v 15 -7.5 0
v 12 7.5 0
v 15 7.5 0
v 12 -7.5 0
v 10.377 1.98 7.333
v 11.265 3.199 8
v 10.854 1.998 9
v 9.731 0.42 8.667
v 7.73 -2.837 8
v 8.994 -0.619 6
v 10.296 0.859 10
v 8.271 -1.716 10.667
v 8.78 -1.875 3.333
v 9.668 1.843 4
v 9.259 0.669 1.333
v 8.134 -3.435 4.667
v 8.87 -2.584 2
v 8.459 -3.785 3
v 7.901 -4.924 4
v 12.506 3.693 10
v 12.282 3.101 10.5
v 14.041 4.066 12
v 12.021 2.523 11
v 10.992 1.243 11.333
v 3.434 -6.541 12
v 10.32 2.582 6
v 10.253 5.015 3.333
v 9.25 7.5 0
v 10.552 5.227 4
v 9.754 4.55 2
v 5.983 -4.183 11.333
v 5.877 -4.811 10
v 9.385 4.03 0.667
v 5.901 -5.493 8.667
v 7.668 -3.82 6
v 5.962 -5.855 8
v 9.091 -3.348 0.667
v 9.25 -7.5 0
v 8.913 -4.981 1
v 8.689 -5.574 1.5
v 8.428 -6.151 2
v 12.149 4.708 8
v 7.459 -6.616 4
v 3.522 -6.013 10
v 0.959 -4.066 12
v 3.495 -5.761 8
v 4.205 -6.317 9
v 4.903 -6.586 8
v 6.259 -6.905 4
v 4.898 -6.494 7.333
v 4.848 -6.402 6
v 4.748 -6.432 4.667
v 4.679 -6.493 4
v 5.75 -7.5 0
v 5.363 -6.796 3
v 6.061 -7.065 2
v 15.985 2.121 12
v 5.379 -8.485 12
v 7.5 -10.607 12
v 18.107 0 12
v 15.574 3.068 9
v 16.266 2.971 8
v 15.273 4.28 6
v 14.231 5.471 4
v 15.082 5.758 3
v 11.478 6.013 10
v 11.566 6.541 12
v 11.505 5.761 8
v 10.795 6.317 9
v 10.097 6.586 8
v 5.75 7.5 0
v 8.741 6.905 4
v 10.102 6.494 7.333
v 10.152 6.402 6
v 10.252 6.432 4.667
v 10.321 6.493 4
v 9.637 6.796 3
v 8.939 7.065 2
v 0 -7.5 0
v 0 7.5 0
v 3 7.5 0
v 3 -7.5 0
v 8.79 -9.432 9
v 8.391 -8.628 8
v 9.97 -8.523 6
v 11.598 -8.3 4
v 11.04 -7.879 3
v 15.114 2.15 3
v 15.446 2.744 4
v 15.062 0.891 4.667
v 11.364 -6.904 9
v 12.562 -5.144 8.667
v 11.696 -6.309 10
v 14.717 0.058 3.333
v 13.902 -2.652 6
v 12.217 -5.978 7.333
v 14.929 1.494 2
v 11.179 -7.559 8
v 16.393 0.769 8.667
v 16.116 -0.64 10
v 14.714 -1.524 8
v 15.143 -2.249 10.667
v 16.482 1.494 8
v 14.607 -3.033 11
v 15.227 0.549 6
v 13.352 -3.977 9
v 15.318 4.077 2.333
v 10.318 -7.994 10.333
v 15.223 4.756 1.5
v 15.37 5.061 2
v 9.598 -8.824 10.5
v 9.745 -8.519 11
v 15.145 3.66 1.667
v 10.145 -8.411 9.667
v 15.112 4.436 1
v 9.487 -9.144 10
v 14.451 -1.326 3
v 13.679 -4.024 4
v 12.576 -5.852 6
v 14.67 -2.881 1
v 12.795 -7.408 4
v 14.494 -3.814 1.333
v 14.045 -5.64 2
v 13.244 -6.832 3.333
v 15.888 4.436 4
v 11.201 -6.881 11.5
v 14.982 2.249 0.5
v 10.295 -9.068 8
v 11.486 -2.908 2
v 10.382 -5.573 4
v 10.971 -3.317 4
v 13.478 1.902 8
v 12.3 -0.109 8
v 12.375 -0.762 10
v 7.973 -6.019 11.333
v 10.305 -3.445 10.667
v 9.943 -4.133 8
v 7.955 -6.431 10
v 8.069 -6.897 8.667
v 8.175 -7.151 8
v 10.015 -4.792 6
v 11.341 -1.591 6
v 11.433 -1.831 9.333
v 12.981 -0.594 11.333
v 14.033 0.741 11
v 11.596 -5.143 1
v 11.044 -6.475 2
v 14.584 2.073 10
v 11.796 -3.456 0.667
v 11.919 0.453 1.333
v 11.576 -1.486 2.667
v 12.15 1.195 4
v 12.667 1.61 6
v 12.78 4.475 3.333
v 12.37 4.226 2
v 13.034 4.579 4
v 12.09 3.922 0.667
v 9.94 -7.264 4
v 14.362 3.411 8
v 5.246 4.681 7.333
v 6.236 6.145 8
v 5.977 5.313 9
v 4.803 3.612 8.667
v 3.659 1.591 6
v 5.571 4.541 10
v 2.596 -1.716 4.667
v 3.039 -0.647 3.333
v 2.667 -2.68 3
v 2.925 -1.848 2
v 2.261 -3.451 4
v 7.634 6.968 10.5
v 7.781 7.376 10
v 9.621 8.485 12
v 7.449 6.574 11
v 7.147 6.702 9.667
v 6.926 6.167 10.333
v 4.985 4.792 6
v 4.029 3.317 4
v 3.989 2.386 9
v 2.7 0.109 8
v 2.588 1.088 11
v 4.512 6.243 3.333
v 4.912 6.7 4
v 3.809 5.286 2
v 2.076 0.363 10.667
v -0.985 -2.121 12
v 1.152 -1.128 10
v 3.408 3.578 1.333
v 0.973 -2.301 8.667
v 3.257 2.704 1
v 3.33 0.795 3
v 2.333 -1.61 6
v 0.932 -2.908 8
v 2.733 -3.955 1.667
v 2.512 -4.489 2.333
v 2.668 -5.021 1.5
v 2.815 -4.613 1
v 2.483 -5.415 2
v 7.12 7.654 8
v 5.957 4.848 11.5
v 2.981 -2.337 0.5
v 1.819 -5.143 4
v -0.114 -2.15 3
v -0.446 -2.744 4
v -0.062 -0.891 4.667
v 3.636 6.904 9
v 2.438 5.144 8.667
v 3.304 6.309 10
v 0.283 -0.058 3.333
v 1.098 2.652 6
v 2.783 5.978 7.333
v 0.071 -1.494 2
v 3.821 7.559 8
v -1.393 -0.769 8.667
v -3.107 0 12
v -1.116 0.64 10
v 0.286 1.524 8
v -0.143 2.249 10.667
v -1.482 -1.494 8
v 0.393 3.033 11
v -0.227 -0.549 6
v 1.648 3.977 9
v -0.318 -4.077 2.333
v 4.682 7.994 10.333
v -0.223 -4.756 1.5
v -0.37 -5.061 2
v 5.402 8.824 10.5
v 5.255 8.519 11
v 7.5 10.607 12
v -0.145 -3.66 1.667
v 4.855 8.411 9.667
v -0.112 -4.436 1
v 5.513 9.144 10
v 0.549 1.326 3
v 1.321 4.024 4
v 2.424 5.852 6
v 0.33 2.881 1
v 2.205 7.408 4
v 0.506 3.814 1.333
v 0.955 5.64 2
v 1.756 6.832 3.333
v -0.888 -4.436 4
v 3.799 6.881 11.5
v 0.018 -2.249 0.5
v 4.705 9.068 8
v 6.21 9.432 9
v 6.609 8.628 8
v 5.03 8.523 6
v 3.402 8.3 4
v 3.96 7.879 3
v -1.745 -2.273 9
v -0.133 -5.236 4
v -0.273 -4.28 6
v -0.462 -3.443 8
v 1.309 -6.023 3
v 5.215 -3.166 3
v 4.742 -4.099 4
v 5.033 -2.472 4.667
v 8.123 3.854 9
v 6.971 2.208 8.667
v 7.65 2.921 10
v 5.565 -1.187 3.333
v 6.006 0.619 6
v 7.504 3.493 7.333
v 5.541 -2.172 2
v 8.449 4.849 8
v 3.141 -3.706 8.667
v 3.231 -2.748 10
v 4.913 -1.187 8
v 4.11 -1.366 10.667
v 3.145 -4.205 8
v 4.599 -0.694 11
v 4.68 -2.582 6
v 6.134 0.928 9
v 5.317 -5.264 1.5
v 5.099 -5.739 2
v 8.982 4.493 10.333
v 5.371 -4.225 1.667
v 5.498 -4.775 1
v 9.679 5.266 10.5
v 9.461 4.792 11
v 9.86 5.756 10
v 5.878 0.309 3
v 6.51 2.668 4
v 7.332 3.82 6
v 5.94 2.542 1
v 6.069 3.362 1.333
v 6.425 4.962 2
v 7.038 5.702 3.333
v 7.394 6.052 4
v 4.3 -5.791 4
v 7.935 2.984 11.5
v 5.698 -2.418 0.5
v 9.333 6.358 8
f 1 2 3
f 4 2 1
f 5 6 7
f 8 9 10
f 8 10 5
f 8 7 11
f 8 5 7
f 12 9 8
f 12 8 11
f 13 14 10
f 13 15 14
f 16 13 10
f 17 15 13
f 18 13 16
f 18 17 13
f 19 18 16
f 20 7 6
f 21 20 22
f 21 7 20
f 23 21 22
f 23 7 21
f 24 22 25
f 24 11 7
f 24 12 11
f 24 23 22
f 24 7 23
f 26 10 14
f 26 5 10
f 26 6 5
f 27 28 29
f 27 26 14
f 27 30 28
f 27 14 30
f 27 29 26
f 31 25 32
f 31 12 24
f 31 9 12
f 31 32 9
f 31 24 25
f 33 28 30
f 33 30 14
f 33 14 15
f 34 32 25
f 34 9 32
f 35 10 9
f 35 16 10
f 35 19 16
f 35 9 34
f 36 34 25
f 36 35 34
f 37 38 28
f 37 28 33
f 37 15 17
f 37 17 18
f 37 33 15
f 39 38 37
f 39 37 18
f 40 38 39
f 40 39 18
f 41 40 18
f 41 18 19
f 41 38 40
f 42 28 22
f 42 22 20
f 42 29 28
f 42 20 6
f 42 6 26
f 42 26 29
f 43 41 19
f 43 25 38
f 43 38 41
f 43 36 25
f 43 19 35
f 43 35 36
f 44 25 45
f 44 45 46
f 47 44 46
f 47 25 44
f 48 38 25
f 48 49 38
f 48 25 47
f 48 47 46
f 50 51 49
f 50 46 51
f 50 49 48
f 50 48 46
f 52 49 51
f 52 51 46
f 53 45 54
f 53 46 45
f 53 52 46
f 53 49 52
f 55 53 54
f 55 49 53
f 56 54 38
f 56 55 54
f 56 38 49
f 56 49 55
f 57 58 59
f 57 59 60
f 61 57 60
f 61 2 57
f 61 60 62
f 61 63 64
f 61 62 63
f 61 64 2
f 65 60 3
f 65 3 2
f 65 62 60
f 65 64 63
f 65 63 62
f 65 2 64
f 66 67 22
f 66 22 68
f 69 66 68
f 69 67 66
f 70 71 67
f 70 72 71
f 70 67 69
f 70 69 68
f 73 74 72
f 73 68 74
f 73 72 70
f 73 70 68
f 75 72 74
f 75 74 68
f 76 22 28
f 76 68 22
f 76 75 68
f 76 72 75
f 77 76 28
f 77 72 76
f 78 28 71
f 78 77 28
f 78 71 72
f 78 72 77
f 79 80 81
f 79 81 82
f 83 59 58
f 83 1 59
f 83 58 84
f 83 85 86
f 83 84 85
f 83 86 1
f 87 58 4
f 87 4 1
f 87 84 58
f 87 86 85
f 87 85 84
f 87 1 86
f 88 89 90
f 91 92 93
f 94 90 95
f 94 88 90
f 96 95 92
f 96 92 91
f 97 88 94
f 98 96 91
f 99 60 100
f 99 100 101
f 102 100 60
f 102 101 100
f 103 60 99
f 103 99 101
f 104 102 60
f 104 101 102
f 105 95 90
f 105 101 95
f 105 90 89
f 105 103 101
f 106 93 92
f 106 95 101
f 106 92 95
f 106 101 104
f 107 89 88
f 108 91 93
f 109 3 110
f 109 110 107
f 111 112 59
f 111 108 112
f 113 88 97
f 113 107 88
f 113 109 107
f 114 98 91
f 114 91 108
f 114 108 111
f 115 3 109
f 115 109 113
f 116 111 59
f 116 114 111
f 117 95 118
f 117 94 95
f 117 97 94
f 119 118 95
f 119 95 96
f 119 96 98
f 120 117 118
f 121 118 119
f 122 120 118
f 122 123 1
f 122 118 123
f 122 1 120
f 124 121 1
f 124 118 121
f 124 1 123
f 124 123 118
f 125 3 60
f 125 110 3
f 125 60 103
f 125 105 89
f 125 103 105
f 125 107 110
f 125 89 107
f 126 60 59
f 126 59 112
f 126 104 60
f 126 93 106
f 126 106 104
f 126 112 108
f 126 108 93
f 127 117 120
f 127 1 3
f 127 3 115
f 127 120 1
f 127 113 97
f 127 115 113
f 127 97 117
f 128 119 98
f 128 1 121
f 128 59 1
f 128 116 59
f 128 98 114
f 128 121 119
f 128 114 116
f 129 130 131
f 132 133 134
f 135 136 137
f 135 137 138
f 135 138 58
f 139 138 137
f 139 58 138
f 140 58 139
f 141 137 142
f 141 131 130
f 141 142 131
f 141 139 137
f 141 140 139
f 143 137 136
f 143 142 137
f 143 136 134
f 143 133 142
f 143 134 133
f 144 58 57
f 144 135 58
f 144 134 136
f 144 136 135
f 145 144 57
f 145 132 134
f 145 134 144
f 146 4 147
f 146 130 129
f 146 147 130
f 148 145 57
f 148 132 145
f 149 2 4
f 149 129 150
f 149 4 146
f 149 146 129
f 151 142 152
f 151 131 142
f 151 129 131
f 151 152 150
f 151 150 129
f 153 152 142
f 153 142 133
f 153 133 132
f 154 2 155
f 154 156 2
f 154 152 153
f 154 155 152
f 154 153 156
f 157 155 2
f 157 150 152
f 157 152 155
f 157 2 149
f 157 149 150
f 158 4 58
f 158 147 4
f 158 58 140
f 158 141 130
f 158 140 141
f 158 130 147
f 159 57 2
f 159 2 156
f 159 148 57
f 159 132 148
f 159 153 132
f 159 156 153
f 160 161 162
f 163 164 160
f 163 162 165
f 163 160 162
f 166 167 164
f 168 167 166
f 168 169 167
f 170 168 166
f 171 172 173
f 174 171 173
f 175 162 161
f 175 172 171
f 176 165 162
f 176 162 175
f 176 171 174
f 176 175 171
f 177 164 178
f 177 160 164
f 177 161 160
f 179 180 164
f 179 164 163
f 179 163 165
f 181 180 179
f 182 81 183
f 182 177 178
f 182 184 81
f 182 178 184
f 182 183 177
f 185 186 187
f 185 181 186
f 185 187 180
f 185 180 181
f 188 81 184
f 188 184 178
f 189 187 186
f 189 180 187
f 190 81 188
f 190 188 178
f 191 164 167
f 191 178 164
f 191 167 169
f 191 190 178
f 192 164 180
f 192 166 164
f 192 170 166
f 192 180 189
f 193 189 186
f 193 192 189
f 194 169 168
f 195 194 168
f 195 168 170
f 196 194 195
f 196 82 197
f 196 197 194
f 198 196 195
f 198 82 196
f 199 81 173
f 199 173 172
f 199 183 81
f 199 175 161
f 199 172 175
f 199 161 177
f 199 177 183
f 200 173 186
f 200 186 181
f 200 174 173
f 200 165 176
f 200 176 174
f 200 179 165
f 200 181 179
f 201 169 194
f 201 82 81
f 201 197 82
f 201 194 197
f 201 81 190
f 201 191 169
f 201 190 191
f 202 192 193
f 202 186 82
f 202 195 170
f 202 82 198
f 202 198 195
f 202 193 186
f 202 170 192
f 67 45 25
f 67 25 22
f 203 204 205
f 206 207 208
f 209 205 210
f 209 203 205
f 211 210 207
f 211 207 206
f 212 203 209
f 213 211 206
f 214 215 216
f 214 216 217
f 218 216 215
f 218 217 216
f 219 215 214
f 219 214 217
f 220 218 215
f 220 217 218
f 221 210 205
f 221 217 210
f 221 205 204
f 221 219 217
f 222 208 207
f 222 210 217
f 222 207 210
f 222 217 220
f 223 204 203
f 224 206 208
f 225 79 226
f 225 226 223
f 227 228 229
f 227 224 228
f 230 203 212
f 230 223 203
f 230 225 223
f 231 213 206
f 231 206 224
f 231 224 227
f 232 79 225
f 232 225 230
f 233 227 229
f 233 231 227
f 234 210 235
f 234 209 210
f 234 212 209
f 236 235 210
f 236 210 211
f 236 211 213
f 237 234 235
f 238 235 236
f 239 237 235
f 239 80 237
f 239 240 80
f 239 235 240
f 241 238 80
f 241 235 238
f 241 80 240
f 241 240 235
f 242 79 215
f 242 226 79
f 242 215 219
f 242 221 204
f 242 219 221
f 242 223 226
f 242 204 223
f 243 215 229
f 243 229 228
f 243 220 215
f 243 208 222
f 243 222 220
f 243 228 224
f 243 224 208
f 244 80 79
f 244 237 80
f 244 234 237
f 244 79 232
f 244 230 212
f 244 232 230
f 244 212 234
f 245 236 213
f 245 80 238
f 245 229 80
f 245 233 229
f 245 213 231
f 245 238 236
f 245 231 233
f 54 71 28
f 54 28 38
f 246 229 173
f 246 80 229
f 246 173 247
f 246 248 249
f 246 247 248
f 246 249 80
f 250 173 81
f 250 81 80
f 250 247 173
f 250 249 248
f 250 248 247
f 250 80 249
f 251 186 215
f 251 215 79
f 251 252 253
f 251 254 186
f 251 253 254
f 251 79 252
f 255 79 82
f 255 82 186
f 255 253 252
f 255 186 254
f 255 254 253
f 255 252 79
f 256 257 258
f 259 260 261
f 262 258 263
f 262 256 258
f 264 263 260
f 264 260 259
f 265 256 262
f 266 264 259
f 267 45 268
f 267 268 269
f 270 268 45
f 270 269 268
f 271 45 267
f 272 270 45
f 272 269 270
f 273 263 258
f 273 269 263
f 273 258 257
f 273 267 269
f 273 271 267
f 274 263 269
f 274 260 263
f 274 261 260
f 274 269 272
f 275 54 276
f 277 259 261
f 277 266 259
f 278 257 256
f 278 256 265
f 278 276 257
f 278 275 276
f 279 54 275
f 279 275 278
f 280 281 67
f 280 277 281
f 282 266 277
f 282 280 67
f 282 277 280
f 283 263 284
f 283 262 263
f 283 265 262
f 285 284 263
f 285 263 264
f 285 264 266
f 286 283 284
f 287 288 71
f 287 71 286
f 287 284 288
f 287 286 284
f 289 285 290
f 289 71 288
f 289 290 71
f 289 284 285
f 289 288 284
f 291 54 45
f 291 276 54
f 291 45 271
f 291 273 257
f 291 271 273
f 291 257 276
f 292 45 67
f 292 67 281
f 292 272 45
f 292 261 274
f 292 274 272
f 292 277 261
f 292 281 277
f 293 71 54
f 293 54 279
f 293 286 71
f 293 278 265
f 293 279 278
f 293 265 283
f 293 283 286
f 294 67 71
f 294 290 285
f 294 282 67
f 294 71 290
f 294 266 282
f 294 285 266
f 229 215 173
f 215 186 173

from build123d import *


with BuildPart() as part:
    # Sketch2 → Loft5 section 0
    with BuildSketch(Plane.XY.offset(12)):
        with BuildLine():
            Line((-3.106601718, 0), (7.5, 10.606601718))
            Line((7.5, 10.606601718), (9.621320344, 8.485281374))
            Line((9.621320344, 8.485281374), (-0.985281374, -2.121320344))
            Line((-0.985281374, -2.121320344), (-3.106601718, 0))
        make_face()
    # Sketch1 → Loft5 section 1
    with BuildSketch(Plane.XY):
        with BuildLine():
            Line((0, -7.5), (3, -7.5))
            Line((3, -7.5), (3, 7.5))
            Line((3, 7.5), (0, 7.5))
            Line((0, 7.5), (0, -7.5))
        make_face()
    loft()


with BuildPart() as body_2:
    # Sketch5 → Loft6 section 0
    with BuildSketch(Plane.XY.offset(12)):
        with BuildLine():
            Line((0.959262274, -4.065863992), (11.565863992, 6.540737726))
            Line((11.565863992, 6.540737726), (14.040737726, 4.065863992))
            Line((14.040737726, 4.065863992), (3.434136008, -6.540737726))
            Line((3.434136008, -6.540737726), (0.959262274, -4.065863992))
        make_face()
    # Sketch3 → Loft6 section 1
    with BuildSketch(Plane.XY):
        with BuildLine():
            Line((5.75, -7.5), (9.25, -7.5))
            Line((9.25, -7.5), (9.25, 7.5))
            Line((9.25, 7.5), (5.75, 7.5))
            Line((5.75, 7.5), (5.75, -7.5))
        make_face()
    loft()


with BuildPart() as body_3:
    # Sketch6 → Loft7 section 0
    with BuildSketch(Plane.XY.offset(12)):
        with BuildLine():
            Line((5.378679656, -8.485281374), (15.985281374, 2.121320344))
            Line((15.985281374, 2.121320344), (18.106601718, 0))
            Line((18.106601718, 0), (7.5, -10.606601718))
            Line((7.5, -10.606601718), (5.378679656, -8.485281374))
        make_face()
    # Sketch4 → Loft7 section 1
    with BuildSketch(Plane.XY):
        with BuildLine():
            Line((12, -7.5), (15, -7.5))
            Line((15, -7.5), (15, 7.5))
            Line((15, 7.5), (12, 7.5))
            Line((12, 7.5), (12, -7.5))
        make_face()
    loft()


solid = Compound([part.part, body_2.part, body_3.part])
